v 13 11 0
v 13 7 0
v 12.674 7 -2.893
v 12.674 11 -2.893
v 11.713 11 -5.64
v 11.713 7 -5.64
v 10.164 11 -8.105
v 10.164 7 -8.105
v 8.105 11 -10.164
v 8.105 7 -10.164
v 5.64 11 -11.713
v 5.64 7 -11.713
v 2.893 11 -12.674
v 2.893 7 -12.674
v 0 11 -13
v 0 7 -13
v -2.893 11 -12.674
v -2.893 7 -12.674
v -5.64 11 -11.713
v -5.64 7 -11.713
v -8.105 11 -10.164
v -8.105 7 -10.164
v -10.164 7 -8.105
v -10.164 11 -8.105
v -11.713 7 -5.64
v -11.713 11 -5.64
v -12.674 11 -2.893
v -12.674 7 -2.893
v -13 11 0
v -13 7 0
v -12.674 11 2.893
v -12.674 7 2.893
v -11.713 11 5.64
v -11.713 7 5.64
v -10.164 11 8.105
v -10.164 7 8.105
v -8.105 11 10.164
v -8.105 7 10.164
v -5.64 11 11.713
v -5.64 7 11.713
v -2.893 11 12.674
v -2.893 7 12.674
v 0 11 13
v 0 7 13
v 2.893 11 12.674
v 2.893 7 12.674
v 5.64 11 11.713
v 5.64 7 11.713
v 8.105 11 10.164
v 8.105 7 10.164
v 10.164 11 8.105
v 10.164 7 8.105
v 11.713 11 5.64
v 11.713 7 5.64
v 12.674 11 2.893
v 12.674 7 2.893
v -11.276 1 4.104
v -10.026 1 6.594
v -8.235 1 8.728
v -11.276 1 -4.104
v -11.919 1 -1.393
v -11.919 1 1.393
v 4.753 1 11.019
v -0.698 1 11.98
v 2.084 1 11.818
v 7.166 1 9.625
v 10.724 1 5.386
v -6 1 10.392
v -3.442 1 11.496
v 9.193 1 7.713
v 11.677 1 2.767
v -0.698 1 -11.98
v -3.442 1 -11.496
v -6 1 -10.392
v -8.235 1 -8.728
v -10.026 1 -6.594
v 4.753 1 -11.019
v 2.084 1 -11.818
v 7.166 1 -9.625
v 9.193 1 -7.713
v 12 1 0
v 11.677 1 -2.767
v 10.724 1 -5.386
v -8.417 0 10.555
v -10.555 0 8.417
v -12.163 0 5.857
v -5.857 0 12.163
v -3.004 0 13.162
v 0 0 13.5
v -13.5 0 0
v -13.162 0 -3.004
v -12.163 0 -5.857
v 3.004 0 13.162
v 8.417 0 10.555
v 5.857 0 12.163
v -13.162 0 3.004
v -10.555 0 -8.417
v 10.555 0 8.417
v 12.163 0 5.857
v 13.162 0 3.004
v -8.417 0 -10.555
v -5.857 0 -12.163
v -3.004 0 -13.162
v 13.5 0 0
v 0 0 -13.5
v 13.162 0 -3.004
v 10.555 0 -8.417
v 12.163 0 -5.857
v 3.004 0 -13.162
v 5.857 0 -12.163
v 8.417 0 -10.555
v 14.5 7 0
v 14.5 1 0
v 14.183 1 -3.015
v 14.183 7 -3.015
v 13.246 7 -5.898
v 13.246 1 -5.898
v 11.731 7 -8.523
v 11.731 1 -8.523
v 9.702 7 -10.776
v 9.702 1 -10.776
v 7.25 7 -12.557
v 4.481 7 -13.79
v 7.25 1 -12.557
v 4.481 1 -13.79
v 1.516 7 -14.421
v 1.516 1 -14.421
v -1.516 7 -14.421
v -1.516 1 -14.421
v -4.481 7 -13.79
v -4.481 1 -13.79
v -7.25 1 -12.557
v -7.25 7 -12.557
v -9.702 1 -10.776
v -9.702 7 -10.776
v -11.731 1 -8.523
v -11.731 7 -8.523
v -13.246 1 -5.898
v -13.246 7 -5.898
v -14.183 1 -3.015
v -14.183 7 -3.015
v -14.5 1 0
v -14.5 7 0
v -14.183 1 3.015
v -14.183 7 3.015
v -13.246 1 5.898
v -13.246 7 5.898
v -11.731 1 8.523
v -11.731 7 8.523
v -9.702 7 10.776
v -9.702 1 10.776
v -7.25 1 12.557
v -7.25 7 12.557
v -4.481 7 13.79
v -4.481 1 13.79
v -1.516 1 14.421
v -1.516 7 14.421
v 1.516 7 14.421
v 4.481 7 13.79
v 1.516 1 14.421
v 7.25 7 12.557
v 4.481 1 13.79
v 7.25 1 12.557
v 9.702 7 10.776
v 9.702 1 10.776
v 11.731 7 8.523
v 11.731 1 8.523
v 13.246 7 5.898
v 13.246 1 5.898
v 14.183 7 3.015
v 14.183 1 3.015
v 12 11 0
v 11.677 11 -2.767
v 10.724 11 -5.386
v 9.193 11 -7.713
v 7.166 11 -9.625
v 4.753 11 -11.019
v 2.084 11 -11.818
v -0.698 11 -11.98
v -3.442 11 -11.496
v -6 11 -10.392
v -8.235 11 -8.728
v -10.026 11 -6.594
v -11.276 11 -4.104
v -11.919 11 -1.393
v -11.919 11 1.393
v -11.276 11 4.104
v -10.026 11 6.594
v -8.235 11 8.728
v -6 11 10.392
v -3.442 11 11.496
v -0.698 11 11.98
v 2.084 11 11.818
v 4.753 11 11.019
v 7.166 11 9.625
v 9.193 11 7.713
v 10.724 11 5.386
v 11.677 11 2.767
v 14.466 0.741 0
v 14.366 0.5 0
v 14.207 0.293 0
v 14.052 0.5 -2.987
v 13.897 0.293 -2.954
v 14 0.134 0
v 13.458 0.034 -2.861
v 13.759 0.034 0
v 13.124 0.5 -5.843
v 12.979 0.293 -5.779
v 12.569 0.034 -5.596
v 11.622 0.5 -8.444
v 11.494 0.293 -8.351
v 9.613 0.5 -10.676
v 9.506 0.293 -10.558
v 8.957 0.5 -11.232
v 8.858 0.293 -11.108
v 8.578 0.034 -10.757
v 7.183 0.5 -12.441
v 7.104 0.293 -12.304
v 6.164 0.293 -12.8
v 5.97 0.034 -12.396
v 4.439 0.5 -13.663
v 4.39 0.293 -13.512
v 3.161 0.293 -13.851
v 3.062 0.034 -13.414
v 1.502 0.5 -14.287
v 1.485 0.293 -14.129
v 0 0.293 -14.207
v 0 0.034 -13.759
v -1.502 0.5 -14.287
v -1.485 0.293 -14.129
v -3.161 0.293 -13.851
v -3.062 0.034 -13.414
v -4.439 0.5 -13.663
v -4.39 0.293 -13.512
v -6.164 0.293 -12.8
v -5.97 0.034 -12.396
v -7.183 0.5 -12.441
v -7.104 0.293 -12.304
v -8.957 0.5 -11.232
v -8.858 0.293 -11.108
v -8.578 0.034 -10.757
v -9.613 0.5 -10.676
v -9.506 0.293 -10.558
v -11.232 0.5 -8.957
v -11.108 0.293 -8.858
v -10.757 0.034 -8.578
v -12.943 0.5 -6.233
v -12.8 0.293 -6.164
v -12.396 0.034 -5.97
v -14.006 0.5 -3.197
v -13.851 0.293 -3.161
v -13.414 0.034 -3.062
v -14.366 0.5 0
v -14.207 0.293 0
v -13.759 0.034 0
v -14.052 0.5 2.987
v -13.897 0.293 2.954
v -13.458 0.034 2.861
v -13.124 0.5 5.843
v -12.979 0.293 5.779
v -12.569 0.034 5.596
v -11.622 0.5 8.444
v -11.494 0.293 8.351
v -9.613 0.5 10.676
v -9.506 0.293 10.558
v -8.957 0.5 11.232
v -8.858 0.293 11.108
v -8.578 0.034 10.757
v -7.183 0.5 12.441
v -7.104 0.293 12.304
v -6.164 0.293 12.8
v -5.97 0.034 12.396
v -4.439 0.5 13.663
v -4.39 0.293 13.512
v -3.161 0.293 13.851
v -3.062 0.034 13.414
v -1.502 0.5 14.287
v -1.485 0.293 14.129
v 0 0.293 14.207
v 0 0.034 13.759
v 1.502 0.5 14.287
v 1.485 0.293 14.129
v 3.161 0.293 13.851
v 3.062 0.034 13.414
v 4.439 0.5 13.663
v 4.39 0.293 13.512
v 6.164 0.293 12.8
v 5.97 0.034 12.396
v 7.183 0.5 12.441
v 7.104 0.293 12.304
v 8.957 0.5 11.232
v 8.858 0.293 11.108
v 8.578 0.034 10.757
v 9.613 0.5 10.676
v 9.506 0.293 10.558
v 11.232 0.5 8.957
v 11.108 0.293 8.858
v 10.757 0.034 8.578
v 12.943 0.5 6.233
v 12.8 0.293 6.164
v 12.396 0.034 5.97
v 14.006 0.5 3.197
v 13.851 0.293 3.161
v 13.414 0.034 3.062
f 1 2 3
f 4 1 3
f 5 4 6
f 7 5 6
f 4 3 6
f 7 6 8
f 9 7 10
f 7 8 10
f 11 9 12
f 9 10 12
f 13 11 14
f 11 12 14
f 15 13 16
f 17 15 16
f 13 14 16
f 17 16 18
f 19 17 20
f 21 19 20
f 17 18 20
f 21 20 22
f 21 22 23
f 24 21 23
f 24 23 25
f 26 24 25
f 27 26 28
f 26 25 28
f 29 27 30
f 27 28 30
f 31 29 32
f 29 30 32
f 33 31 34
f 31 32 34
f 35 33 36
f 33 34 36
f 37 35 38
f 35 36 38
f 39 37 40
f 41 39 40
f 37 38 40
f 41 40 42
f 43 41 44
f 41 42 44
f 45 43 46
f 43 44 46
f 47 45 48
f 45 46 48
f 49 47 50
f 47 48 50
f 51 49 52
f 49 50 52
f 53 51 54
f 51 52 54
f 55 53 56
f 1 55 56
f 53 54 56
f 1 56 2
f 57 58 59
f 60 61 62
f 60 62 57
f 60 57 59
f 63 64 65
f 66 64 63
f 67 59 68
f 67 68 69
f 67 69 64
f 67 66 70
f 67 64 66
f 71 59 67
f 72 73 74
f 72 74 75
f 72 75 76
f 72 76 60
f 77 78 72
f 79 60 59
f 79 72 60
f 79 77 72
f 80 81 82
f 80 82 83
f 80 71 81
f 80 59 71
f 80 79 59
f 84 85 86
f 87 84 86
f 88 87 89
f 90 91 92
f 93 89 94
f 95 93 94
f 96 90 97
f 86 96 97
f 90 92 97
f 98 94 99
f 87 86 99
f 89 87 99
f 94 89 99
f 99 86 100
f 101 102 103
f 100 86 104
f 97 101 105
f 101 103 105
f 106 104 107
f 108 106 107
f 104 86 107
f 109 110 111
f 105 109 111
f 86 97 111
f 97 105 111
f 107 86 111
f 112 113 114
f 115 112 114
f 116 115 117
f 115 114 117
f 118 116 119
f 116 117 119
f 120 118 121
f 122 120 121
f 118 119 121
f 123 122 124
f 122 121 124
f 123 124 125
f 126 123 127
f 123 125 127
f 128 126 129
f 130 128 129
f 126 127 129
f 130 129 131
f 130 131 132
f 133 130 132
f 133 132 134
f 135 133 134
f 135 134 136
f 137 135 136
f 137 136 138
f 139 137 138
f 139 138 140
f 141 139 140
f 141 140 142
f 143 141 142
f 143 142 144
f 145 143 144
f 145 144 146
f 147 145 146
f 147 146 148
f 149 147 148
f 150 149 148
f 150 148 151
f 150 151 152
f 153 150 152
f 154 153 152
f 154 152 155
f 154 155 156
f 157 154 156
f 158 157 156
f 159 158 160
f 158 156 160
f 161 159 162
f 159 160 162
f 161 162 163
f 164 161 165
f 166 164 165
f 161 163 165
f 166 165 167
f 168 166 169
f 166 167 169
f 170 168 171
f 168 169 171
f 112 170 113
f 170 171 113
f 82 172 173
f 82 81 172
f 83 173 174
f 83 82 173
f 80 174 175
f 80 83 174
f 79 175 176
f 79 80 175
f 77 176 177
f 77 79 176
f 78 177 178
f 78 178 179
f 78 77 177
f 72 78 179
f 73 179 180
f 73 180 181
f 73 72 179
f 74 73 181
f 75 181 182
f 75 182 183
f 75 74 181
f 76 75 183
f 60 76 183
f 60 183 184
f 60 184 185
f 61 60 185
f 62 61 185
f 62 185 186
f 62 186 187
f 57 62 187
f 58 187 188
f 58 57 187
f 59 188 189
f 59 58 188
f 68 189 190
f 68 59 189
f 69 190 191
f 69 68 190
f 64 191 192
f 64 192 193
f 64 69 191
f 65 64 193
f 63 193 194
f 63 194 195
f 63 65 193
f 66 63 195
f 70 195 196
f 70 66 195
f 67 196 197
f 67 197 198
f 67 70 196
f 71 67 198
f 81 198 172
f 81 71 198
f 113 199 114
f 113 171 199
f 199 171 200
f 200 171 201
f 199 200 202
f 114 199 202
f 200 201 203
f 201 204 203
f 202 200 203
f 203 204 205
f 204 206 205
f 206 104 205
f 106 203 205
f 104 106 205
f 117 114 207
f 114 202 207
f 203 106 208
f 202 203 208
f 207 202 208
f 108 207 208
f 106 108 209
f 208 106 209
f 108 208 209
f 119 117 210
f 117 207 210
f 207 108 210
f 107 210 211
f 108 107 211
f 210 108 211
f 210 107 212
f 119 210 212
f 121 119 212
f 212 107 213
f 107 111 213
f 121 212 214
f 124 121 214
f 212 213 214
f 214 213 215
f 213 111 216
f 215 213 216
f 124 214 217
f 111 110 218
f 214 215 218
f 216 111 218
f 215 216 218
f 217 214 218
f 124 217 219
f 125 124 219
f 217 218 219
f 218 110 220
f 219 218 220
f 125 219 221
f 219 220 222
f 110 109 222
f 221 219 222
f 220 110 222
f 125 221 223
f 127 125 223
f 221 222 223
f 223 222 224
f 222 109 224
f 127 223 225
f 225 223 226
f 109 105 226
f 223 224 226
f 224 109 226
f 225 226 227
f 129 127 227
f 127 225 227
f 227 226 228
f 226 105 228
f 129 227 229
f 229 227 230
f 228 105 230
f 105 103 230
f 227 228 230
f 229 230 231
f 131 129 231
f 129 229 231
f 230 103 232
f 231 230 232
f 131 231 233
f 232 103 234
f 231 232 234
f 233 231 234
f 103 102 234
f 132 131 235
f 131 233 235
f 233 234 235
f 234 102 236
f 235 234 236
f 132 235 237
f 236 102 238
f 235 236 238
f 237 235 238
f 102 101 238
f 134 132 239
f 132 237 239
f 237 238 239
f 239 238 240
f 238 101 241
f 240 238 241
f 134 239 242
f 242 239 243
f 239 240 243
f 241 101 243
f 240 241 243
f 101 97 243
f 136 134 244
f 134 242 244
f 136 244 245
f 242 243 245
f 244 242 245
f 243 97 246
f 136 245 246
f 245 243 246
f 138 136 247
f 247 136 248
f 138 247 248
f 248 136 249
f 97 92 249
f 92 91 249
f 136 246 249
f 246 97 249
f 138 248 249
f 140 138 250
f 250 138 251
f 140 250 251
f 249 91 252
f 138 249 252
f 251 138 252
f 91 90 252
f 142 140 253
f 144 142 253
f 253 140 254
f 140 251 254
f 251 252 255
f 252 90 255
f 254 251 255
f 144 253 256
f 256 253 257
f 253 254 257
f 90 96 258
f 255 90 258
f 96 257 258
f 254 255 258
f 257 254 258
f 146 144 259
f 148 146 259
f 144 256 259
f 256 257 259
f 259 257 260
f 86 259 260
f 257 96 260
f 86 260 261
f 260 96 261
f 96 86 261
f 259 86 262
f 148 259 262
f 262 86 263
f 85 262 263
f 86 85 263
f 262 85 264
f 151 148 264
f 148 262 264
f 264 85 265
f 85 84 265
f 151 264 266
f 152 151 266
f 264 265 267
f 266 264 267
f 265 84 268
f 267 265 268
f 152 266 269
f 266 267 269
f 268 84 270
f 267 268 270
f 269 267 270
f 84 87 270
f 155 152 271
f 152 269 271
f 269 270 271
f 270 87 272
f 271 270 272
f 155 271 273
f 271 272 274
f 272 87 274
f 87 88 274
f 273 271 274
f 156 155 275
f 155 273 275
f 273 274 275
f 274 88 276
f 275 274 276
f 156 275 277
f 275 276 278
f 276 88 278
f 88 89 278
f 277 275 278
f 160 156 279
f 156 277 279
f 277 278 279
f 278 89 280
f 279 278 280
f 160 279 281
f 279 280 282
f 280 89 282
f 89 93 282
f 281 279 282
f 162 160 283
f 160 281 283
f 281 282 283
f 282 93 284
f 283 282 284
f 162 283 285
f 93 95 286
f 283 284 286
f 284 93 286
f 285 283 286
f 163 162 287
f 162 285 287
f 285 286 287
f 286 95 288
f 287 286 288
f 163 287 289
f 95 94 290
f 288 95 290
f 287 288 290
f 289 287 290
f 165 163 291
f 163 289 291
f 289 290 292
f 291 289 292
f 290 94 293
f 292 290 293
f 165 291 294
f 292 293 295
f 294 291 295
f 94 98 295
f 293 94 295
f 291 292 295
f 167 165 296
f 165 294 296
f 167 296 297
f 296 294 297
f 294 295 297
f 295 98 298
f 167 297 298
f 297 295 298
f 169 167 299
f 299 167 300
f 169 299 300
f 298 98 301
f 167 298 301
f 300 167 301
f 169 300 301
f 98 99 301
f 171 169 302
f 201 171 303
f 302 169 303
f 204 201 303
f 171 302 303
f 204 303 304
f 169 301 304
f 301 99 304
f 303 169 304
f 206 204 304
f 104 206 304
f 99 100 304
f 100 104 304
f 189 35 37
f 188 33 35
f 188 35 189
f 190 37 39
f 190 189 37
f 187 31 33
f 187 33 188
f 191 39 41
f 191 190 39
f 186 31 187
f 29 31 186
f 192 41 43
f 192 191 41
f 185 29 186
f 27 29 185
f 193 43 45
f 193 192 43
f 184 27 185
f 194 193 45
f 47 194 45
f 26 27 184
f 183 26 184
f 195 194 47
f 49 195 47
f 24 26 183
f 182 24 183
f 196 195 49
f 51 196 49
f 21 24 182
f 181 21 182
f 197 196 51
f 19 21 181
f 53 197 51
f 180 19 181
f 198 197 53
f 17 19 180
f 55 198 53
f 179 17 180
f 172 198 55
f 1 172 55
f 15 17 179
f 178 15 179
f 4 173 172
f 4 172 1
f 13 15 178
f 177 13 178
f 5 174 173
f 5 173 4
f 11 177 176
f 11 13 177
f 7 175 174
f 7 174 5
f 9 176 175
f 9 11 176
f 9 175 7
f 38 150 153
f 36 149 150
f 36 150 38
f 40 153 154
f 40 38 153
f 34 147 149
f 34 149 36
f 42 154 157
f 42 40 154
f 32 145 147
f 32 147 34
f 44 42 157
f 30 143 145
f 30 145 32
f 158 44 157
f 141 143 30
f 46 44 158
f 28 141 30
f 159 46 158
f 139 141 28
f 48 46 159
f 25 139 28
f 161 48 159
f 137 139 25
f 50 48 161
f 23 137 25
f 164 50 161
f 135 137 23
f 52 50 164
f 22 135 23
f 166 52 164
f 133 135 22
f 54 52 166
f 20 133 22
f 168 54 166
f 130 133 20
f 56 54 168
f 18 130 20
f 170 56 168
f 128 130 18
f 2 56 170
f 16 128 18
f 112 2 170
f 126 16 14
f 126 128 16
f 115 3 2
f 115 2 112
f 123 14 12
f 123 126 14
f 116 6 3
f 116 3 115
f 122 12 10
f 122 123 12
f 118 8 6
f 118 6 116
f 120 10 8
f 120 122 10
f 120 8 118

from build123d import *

# Parameters (mm, degrees)
SKETCH1_R           = 14.5
BOSS_EXTRUDE1_DEPTH = 1
SKETCH2_R           = 14.5
SKETCH2_R_2         = 12
BOSS_EXTRUDE2_DEPTH = 6
SKETCH3_R           = 13
SKETCH3_R_2         = 12
BOSS_EXTRUDE3_DEPTH = 4
FILLET1_R           = 1


with BuildPart() as part:
    # Sketch1 → Boss-Extrude1 (new body)
    with BuildSketch(Plane(origin=(0, 0, 0), x_dir=(1, 0, 0), z_dir=(0, 1, 0))):
        Circle(SKETCH1_R)
    extrude(amount=BOSS_EXTRUDE1_DEPTH)

    # Sketch2 → Boss-Extrude2 (add)
    with BuildSketch(Plane(origin=(0, 1, 0), x_dir=(1, 0, 0), z_dir=(0, 1, 0))):
        Circle(SKETCH2_R)
        Circle(SKETCH2_R_2, mode=Mode.SUBTRACT)
    extrude(amount=BOSS_EXTRUDE2_DEPTH)

    # Sketch3 → Boss-Extrude3 (add)
    with BuildSketch(Plane(origin=(0, 7, 0), x_dir=(1, 0, 0), z_dir=(0, 1, 0))):
        Circle(SKETCH3_R)
        Circle(SKETCH3_R_2, mode=Mode.SUBTRACT)
    extrude(amount=BOSS_EXTRUDE3_DEPTH)

    # Fillet1
    fillet1_edges = [part.edges().sort_by_distance(p)[0] for p in [
        (-14.5, 0, 0),
    ]]
    fillet(fillet1_edges, radius=FILLET1_R)


solid = part.part
